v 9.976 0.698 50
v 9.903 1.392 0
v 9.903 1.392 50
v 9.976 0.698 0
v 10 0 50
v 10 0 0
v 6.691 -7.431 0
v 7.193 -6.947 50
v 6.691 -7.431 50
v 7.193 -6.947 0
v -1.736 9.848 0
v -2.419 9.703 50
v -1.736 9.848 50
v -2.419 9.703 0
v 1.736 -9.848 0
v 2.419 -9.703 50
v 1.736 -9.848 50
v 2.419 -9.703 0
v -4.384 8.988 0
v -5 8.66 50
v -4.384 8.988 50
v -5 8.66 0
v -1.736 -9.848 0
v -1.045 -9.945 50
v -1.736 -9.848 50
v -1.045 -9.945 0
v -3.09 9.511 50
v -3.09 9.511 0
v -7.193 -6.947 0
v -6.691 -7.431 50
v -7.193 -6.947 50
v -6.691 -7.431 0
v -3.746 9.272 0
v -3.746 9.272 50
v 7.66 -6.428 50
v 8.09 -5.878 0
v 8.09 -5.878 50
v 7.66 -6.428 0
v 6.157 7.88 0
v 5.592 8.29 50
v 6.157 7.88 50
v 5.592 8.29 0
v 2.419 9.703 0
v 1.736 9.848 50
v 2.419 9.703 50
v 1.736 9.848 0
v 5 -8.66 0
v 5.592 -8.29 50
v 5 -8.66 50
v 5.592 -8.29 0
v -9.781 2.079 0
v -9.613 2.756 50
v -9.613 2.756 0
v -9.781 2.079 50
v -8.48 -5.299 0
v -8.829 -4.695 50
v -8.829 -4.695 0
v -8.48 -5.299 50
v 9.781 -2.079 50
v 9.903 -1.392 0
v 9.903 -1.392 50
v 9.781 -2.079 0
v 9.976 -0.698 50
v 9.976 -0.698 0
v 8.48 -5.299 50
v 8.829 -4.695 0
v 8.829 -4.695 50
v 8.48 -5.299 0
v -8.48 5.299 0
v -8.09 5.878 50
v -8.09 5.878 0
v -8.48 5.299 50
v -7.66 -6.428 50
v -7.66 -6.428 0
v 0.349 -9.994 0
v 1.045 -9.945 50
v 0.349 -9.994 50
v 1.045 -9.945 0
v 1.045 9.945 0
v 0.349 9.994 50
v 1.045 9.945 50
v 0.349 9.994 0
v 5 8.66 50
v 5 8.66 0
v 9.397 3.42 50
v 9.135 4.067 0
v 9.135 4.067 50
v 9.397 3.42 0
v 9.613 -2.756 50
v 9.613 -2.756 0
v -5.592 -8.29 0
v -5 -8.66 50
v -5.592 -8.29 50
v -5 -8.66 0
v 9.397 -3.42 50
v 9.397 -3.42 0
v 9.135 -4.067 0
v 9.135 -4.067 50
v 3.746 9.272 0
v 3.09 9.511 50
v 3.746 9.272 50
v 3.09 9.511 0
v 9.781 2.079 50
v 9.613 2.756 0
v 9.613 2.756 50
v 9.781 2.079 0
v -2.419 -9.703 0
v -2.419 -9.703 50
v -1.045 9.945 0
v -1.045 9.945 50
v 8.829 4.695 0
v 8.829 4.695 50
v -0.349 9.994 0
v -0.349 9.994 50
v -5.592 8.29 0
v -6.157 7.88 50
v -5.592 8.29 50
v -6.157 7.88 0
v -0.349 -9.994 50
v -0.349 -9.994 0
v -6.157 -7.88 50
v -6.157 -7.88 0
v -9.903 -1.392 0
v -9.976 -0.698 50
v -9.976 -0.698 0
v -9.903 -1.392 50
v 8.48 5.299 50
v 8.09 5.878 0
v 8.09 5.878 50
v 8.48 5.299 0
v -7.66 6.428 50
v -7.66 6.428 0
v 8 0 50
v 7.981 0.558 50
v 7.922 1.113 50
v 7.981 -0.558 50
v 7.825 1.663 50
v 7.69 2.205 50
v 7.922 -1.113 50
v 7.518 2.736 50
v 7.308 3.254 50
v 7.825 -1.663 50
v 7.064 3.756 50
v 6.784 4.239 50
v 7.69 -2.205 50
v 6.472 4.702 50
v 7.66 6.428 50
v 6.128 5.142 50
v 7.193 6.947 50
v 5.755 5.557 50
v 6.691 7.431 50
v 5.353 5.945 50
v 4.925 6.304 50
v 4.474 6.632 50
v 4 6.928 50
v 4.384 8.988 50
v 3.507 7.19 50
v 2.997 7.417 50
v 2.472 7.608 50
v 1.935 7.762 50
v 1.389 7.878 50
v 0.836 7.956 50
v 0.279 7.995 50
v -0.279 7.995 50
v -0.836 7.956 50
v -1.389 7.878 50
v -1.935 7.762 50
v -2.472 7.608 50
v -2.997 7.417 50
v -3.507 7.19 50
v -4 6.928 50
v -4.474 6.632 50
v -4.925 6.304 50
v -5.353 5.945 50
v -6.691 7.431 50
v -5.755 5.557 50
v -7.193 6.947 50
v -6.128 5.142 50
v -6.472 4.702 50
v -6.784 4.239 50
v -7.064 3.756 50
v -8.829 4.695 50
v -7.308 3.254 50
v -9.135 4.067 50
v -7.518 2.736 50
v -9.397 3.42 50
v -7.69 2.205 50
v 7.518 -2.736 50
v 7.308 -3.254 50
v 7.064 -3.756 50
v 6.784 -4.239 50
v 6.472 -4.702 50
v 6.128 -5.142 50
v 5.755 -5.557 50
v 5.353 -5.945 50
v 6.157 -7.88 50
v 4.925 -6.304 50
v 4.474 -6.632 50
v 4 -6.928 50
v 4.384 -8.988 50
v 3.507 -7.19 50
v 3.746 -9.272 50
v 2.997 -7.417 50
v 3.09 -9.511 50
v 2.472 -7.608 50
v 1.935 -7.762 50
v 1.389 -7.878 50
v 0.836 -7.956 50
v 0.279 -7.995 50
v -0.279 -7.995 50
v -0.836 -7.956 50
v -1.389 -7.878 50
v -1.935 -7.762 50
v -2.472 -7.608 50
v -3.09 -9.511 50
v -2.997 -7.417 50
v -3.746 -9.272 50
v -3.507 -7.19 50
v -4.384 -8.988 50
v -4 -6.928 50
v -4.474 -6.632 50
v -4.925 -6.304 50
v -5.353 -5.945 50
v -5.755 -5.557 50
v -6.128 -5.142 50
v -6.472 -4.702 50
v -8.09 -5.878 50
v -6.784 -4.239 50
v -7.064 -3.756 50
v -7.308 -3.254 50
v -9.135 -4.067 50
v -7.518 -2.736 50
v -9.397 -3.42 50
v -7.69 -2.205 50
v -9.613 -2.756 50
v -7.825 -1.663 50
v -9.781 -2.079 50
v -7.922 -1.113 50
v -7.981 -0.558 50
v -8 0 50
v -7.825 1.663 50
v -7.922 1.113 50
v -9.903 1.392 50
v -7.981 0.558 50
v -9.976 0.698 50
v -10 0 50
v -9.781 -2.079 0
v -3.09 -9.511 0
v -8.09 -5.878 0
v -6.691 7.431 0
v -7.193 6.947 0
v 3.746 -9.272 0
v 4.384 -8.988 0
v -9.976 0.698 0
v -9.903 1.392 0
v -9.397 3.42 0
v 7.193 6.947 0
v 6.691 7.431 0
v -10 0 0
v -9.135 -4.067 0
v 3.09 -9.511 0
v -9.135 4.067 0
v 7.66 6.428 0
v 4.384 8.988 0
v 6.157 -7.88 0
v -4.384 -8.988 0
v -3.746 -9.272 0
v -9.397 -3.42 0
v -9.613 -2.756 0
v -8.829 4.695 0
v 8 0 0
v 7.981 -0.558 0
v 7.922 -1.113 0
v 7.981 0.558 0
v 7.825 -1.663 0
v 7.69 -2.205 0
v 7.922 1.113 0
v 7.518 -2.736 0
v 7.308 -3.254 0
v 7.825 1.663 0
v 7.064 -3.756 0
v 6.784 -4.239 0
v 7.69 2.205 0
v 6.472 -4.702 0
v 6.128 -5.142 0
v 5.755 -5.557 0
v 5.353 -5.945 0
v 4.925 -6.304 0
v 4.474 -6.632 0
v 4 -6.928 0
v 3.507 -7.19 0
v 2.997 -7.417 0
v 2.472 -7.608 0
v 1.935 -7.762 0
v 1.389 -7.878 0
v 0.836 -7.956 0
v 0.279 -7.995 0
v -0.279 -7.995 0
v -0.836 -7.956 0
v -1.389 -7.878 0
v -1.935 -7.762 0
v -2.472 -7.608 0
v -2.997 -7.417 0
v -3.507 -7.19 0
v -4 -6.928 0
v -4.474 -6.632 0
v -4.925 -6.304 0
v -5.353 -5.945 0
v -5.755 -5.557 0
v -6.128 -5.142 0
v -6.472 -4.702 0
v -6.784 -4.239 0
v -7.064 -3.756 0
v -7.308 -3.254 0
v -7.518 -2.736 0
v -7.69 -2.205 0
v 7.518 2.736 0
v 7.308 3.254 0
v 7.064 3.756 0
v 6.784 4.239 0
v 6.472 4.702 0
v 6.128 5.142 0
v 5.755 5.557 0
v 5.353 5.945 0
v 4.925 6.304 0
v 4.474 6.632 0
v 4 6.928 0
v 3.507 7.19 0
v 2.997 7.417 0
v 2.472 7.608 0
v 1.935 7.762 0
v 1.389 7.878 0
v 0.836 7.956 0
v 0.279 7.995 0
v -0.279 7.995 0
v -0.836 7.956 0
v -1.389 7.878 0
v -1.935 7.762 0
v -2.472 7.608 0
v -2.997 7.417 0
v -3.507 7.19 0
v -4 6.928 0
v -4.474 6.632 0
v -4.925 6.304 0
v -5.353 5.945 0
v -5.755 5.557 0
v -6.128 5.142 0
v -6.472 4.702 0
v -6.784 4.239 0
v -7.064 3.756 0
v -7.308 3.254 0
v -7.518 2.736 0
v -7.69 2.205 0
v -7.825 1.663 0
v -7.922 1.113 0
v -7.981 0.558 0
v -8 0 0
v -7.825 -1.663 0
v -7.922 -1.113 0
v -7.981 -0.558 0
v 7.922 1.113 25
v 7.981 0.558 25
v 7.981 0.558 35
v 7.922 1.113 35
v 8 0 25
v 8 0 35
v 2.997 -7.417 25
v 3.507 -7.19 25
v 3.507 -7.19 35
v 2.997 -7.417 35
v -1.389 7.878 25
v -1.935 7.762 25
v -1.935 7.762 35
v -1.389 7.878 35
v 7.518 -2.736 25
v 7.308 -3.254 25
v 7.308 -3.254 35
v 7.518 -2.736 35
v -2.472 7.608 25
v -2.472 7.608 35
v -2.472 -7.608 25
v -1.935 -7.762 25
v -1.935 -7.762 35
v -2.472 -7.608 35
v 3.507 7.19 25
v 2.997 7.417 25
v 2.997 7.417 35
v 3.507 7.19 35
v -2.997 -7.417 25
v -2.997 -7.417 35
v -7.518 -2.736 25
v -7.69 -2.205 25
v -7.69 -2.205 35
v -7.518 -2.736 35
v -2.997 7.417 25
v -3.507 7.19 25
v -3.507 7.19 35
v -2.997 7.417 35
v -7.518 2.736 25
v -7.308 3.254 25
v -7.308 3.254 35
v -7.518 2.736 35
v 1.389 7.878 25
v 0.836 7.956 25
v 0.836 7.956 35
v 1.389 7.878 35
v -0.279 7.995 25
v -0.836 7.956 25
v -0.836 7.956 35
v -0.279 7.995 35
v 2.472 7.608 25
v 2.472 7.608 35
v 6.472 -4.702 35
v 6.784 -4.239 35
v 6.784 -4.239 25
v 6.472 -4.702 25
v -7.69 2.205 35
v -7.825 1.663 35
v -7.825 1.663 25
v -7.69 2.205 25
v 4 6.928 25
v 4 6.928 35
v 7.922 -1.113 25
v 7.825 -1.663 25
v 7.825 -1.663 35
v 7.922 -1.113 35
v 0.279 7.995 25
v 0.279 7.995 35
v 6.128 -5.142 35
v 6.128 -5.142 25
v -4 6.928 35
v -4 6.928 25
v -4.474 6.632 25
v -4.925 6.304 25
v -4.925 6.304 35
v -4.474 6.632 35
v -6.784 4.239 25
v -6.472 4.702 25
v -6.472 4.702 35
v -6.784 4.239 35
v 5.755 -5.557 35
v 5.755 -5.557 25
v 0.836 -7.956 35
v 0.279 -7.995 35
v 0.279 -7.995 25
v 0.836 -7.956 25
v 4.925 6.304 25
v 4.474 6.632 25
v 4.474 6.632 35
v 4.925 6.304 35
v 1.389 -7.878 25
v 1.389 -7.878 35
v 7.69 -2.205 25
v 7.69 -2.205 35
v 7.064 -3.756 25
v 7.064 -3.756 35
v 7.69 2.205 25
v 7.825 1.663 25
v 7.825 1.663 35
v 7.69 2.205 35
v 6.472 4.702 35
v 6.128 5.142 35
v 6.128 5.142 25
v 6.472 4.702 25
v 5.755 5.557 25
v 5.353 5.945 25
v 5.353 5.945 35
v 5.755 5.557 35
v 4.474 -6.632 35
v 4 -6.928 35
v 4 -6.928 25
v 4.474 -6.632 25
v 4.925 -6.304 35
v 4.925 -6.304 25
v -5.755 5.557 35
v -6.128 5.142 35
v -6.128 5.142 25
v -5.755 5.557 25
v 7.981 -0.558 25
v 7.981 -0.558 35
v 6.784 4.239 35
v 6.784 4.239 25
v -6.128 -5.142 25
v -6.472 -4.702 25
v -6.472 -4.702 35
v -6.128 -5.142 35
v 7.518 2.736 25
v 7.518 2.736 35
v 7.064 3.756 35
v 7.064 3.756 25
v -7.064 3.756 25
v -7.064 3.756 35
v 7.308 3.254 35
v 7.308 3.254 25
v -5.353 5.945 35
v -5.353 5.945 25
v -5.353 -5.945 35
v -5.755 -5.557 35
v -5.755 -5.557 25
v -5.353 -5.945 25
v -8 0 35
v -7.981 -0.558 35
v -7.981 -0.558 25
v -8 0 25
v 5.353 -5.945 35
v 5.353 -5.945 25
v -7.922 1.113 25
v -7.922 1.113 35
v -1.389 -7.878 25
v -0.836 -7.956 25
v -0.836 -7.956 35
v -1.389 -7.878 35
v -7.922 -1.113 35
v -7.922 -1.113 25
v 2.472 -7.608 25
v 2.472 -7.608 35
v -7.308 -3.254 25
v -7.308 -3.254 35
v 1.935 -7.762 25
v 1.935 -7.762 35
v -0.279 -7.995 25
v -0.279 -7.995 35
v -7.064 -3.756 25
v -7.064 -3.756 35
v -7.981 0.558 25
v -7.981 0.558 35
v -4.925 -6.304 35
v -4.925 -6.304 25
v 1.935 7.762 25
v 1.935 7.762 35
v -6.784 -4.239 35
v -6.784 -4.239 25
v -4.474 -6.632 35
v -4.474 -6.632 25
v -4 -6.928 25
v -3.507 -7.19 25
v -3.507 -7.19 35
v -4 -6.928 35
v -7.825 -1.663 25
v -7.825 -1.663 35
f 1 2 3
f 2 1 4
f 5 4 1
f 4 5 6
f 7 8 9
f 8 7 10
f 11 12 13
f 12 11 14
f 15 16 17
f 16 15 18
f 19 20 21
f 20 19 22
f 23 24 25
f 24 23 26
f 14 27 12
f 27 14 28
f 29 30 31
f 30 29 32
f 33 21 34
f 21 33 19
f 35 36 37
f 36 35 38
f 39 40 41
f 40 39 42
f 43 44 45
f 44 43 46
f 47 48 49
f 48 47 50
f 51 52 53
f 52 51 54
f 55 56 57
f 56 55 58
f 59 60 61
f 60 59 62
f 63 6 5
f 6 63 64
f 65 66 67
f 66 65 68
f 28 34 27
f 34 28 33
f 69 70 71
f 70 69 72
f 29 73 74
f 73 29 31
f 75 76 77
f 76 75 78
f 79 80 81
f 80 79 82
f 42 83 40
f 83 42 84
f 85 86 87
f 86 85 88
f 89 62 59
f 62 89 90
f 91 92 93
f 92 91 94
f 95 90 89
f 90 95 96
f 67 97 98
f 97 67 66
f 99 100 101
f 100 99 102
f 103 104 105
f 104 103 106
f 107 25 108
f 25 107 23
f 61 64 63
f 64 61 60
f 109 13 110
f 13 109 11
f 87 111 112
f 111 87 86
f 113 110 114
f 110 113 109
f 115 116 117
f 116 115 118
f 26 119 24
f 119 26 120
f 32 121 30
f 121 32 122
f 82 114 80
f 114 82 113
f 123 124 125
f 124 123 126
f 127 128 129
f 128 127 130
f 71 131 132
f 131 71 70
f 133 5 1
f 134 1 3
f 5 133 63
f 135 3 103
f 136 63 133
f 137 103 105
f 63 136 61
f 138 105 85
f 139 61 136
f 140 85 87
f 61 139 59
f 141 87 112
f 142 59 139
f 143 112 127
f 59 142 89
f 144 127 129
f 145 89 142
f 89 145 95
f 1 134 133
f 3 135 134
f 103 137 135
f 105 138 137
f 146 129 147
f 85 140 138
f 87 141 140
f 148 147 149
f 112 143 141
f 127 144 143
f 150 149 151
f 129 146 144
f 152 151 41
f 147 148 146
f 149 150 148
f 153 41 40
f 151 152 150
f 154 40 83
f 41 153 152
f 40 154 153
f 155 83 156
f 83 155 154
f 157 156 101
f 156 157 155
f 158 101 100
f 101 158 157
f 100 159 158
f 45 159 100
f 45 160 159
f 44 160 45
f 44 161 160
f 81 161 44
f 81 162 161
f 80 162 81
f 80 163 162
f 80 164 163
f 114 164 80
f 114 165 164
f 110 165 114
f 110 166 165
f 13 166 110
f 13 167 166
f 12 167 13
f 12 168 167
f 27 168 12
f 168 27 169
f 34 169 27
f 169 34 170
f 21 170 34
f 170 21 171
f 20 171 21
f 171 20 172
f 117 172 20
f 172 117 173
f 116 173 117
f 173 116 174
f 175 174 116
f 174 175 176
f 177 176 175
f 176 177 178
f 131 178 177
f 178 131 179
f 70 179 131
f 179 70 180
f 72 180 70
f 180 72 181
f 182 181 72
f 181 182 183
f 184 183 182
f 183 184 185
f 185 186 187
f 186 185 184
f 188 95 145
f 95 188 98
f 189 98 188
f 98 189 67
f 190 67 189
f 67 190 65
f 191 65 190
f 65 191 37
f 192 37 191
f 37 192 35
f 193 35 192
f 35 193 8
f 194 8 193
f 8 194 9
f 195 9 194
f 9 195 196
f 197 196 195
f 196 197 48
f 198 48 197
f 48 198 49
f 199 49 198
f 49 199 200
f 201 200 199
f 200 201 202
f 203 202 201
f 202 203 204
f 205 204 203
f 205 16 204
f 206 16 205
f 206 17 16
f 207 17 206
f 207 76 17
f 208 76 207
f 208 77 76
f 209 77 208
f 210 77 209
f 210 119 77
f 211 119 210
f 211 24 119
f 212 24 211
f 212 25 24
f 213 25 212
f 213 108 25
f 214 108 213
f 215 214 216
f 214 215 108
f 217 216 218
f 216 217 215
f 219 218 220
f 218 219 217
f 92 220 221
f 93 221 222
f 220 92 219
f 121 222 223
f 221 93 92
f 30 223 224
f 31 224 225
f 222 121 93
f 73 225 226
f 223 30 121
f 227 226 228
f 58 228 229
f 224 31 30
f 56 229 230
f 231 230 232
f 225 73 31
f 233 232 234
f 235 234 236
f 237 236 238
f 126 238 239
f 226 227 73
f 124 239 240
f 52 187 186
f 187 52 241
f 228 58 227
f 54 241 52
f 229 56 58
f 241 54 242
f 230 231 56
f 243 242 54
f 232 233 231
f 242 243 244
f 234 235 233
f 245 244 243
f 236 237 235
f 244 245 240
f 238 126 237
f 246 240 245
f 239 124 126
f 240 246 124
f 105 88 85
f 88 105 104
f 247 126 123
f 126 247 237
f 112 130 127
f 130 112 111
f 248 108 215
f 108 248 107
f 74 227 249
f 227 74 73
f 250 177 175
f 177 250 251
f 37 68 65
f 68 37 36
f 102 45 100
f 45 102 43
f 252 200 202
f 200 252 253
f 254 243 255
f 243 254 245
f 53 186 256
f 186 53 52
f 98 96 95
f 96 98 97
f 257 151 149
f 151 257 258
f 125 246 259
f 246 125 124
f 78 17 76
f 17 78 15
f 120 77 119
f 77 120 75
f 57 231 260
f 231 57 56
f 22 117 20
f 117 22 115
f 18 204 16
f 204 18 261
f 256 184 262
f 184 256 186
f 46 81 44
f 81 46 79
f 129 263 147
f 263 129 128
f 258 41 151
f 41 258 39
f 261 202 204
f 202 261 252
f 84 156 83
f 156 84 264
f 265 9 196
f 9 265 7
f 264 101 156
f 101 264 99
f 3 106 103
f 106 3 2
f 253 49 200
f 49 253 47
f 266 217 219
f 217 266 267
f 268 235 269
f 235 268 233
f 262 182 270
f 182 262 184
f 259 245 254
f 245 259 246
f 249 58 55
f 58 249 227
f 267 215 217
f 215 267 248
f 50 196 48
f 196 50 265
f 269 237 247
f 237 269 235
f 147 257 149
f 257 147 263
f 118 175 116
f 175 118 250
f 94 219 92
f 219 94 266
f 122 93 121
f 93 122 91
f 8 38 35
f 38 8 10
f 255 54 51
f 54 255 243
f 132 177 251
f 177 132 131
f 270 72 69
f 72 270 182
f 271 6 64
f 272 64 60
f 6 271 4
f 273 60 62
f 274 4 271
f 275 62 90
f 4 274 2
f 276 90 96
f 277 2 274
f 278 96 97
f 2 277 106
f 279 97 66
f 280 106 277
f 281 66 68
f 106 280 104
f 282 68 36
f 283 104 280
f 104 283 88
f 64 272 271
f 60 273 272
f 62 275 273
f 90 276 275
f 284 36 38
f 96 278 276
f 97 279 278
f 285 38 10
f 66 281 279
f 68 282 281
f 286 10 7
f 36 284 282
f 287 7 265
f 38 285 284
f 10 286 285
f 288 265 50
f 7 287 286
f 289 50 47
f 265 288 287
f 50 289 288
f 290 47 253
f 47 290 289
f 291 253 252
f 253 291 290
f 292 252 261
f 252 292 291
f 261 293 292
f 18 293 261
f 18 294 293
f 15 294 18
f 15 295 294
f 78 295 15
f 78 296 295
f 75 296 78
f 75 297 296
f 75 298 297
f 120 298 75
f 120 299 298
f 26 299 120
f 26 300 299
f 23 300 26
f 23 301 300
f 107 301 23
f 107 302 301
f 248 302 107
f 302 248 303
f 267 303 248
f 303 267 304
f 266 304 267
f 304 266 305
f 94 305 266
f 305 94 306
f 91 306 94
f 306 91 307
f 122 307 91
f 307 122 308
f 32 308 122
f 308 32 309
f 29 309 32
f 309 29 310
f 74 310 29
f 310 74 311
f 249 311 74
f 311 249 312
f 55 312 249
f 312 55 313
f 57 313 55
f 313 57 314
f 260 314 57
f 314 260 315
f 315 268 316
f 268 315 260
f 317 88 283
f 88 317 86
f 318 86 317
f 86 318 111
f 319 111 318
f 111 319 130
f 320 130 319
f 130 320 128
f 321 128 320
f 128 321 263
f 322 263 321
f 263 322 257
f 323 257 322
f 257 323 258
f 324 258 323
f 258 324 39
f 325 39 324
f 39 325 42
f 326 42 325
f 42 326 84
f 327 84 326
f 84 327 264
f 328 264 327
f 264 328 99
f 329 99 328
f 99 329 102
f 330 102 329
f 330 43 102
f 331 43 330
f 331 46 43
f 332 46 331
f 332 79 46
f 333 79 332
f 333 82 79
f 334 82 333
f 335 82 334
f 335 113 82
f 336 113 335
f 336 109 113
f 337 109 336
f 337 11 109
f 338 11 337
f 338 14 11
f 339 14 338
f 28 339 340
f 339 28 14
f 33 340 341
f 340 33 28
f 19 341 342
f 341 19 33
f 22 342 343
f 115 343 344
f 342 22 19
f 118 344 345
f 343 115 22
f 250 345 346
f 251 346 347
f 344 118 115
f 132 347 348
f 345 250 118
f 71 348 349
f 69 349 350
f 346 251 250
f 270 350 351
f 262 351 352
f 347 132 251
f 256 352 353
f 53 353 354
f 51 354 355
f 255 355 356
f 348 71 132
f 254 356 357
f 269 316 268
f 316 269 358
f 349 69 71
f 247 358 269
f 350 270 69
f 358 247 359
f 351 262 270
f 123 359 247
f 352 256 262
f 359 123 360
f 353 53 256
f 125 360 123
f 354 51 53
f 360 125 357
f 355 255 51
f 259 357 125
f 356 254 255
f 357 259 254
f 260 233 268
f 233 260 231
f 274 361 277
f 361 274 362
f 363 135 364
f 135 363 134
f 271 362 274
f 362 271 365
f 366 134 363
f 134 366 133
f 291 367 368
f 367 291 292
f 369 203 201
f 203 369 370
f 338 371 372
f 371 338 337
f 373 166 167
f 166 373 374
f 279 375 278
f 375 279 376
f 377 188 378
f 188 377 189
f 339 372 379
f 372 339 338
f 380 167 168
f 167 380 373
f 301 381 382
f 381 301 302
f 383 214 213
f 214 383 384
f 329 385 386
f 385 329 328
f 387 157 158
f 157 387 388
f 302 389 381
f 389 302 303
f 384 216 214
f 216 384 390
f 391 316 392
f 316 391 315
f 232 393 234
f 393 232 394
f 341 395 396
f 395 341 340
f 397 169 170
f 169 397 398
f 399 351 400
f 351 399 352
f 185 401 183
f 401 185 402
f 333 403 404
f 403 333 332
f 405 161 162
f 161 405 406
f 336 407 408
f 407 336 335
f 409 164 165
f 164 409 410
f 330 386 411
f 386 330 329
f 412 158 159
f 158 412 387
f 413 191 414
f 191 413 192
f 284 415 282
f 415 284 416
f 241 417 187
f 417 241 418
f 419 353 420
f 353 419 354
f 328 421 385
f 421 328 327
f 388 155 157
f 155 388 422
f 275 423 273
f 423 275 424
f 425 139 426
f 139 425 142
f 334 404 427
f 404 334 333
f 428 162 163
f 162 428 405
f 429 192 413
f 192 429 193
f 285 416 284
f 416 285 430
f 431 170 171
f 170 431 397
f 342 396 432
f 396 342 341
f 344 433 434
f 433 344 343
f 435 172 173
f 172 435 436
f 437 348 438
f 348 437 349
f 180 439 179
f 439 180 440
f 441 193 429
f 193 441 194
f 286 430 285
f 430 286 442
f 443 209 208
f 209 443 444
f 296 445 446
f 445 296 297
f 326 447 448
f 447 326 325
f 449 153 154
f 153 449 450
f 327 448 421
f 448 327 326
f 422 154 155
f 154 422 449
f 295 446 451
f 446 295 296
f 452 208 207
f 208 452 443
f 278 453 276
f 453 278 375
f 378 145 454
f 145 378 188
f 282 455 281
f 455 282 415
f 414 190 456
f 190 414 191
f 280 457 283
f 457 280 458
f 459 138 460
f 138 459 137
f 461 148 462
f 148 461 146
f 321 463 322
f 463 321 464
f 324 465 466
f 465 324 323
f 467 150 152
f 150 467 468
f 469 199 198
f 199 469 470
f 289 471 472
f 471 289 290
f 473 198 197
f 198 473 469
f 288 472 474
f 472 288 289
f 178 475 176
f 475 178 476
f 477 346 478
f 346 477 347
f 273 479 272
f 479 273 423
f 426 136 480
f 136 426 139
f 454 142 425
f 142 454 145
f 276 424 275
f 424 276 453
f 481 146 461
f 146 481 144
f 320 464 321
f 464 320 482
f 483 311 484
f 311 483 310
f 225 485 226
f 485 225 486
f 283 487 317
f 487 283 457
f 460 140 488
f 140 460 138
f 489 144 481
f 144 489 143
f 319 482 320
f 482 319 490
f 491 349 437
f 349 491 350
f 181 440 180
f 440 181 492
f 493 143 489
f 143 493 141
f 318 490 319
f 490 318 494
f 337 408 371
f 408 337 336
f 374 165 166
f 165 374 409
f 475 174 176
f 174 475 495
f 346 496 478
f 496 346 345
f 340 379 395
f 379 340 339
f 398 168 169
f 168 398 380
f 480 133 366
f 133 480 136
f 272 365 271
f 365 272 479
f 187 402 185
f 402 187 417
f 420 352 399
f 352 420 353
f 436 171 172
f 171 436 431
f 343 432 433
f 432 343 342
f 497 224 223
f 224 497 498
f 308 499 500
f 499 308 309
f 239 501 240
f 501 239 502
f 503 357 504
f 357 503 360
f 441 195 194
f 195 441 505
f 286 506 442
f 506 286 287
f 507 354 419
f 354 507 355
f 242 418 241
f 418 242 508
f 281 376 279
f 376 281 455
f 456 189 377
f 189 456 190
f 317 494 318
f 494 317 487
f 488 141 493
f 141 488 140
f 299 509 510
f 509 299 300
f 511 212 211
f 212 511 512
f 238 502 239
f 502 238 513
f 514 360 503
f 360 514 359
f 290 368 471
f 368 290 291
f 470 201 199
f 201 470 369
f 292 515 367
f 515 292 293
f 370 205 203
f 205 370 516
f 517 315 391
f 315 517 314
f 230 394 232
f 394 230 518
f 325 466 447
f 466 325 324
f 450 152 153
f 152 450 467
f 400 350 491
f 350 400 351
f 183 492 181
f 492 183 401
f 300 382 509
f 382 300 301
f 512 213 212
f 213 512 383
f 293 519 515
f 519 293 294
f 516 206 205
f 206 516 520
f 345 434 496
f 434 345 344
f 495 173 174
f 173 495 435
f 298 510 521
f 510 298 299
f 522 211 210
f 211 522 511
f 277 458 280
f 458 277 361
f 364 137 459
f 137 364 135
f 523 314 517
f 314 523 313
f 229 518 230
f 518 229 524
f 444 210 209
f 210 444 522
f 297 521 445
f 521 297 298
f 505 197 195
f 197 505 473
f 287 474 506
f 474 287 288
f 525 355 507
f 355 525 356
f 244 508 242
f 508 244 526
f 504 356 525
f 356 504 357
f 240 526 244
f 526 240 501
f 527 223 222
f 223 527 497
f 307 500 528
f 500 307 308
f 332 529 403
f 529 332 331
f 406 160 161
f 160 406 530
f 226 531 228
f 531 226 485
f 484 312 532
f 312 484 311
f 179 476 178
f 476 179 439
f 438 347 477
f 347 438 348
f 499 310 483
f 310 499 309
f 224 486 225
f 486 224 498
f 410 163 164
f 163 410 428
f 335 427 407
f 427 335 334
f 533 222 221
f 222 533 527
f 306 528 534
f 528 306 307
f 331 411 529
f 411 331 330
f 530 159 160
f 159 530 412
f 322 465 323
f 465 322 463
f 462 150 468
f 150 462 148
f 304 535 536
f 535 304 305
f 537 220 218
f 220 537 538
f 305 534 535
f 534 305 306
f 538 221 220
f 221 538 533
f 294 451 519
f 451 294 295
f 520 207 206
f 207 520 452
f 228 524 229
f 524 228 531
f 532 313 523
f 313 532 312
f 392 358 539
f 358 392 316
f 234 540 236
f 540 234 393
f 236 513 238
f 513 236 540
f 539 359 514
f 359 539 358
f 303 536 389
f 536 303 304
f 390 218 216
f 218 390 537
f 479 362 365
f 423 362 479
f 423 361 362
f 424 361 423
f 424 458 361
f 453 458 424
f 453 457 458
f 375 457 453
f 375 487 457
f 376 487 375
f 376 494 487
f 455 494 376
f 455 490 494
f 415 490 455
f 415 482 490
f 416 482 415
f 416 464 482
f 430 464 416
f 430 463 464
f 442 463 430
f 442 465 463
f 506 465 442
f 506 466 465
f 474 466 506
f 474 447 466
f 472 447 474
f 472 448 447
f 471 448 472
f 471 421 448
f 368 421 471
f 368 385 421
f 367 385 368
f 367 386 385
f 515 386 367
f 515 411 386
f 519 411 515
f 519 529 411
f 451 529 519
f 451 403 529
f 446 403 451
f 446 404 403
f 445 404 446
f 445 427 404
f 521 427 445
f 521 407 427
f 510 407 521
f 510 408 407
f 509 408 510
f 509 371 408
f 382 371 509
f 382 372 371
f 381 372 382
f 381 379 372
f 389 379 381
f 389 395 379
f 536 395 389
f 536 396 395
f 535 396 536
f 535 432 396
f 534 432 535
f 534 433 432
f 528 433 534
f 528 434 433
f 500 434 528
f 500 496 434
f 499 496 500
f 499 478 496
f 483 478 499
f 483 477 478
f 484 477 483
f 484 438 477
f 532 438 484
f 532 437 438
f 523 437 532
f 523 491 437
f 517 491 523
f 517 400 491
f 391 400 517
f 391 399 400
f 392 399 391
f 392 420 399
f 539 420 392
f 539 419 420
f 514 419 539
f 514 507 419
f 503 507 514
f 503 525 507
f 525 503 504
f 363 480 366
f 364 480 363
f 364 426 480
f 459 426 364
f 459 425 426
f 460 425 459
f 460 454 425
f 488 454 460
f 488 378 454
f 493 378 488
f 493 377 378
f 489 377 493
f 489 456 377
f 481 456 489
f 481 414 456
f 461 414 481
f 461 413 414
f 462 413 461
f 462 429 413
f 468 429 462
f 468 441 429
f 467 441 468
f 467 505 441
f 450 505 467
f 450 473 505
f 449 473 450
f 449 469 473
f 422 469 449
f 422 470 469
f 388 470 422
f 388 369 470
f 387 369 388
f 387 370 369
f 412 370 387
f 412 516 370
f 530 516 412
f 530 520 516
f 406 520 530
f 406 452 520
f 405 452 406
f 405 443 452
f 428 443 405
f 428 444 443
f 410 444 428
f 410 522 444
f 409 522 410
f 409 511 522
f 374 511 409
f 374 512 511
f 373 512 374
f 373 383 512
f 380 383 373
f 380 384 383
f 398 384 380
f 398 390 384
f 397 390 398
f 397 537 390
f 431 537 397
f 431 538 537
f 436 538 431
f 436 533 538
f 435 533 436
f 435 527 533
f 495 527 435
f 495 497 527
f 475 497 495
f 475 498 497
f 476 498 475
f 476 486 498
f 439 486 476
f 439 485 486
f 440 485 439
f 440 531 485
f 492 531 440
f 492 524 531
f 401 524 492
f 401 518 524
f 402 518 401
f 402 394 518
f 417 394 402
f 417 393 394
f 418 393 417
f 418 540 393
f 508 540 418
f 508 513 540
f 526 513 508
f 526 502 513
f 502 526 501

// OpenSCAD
$fn=90;
difference(1)
{
 cylinder(50,10,10);
cylinder (50,8,8);
}
#translate([0,0,25]) cylinder(10,8,8); 
